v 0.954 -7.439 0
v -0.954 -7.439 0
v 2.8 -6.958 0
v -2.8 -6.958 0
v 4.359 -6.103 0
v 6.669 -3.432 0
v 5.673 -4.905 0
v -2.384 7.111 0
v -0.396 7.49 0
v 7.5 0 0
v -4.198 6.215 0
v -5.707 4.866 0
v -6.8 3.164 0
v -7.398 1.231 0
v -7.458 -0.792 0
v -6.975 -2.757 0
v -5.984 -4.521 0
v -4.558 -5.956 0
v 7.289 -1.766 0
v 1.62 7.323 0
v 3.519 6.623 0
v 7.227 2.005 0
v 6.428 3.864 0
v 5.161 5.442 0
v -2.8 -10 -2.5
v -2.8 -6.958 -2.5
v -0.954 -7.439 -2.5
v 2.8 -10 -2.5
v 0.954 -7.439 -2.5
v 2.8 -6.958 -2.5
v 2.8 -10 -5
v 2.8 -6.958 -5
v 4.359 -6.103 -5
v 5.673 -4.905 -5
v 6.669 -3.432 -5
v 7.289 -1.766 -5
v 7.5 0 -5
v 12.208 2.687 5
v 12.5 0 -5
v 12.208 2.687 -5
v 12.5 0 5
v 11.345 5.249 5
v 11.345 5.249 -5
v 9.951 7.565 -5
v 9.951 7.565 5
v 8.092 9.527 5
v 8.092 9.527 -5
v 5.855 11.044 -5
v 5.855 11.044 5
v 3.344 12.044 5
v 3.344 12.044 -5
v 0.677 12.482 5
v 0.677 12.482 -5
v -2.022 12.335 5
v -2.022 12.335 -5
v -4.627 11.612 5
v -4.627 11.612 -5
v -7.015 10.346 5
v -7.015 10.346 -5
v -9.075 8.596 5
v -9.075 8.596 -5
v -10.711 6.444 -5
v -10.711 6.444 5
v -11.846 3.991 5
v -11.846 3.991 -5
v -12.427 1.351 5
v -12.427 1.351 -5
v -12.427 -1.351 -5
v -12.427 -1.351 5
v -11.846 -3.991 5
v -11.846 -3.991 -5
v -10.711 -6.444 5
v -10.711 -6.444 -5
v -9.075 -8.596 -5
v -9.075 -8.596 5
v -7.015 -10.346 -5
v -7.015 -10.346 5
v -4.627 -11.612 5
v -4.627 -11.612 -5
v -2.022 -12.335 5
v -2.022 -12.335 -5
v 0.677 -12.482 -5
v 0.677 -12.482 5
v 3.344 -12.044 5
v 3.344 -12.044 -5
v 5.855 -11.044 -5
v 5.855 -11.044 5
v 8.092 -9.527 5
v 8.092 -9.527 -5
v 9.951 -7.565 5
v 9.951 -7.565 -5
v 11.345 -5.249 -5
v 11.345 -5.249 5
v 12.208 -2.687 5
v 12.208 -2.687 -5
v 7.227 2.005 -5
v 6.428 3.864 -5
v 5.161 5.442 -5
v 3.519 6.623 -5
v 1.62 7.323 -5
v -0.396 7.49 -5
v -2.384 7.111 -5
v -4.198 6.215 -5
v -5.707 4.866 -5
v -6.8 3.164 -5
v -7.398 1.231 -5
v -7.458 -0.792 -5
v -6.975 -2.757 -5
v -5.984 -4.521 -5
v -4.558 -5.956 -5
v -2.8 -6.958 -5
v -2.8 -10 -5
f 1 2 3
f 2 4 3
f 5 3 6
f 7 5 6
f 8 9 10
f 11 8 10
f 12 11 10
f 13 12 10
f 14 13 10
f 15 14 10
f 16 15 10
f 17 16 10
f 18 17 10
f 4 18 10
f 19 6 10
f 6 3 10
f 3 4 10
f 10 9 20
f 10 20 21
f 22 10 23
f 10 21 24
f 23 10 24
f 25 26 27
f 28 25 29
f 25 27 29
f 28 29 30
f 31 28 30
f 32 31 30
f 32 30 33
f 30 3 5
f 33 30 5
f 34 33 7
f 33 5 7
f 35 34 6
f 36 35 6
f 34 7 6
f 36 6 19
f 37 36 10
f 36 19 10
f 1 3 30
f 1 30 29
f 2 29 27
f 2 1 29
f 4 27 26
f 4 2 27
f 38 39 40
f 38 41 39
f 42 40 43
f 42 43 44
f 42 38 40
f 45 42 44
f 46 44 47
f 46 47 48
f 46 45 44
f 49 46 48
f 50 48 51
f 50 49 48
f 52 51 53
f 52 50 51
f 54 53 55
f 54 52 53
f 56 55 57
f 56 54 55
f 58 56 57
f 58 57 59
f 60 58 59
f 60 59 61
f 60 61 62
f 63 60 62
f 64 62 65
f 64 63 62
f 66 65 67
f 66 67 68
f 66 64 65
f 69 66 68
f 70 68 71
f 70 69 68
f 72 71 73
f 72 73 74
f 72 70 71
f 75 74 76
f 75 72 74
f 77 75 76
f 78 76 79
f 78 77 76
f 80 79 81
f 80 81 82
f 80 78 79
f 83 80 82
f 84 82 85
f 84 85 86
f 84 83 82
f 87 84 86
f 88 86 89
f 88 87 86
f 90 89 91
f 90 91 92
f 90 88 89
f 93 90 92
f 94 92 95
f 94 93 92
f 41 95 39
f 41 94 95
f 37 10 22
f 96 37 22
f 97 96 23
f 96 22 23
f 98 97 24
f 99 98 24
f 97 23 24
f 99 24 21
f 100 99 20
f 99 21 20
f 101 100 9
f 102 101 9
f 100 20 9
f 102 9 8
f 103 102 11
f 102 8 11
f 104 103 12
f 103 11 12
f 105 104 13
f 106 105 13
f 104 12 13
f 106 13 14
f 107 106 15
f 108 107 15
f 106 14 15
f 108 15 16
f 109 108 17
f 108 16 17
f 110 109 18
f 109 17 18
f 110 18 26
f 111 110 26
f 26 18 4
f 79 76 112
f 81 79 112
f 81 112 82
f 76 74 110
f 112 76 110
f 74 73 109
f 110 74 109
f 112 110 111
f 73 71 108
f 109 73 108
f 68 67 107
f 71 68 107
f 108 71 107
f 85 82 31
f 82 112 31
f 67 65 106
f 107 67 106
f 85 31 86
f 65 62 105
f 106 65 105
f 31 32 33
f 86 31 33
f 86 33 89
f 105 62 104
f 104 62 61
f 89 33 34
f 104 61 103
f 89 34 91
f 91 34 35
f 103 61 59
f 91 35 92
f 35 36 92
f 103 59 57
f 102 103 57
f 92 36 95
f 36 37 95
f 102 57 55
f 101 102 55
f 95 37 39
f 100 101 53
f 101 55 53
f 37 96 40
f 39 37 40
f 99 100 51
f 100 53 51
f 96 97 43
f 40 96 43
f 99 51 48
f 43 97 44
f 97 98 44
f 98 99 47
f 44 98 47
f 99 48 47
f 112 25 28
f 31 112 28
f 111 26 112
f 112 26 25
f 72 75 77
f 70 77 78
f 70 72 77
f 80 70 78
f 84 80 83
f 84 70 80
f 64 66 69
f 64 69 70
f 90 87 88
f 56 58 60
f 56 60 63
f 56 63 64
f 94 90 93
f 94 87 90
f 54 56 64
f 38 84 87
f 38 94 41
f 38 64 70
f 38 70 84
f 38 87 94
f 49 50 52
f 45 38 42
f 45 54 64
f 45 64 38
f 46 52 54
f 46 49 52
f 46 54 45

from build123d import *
from build123d import SkipClean  # not in build123d's __all__

# Parameters (mm, degrees)
F0_R     = 12.5
F1_DEPTH = 5
F2_DEPTH = 5.001
F3_DEPTH = 2.5


with BuildPart() as f1:
    # F0 (on Top) → F1 (new body, symmetric)
    with BuildSketch(Plane.XY):
        Circle(F0_R)
        with BuildLine():
            ThreePointArc((-2.8, -6.9577295147), (-4.1982139059, 6.2149014473), (7.5, 0))
            ThreePointArc((7.5, 0), (6.2149014473, -4.1982139059), (2.8, -6.9577295147))
            Line((2.8, -6.9577295147), (2.8, -10))
            Line((2.8, -10), (0, -10))
            Line((0, -10), (-2.8, -10))
            Line((-2.8, -10), (-2.8, -6.9577295147))
        make_face(mode=Mode.SUBTRACT)
        with BuildLine():
            ThreePointArc((2.8, -6.9577295147), (6.2149014473, -4.1982139059), (7.5, 0))
            ThreePointArc((7.5, 0), (-4.1982139059, 6.2149014473), (-2.8, -6.9577295147))
            ThreePointArc((-2.8, -6.9577295147), (0, -7.5), (2.8, -6.9577295147))
        make_face()
        with BuildLine():
            ThreePointArc((2.8, -6.9577295147), (0, -7.5), (-2.8, -6.9577295147))
            Line((-2.8, -6.9577295147), (-2.8, -10))
            Line((-2.8, -10), (0, -10))
            Line((0, -10), (2.8, -10))
            Line((2.8, -10), (2.8, -6.9577295147))
        make_face()
    extrude(amount=F1_DEPTH, both=True)

    # F0 (on Top) → F2 (cut, through all)
    with BuildSketch(Plane.XY):
        with BuildLine():
            ThreePointArc((2.8, -6.9577295147), (0, -7.5), (-2.8, -6.9577295147))
            Line((-2.8, -6.9577295147), (-2.8, -10))
            Line((-2.8, -10), (0, -10))
            Line((0, -10), (2.8, -10))
            Line((2.8, -10), (2.8, -6.9577295147))
        make_face()
        with BuildLine():
            ThreePointArc((2.8, -6.9577295147), (6.2149014473, -4.1982139059), (7.5, 0))
            ThreePointArc((7.5, 0), (-4.1982139059, 6.2149014473), (-2.8, -6.9577295147))
            ThreePointArc((-2.8, -6.9577295147), (0, -7.5), (2.8, -6.9577295147))
        make_face()
    extrude(amount=-F2_DEPTH, mode=Mode.SUBTRACT)

    # F0 (on Top) → F3 (join)
    with BuildSketch(Plane.XY):
        with BuildLine():
            ThreePointArc((2.8, -6.9577295147), (0, -7.5), (-2.8, -6.9577295147))
            Line((-2.8, -6.9577295147), (-2.8, -10))
            Line((-2.8, -10), (0, -10))
            Line((0, -10), (2.8, -10))
            Line((2.8, -10), (2.8, -6.9577295147))
        make_face()
    with SkipClean():  # cleaning this boolean's faces spoils the solid; the shape is the same uncleaned
        extrude(amount=-F3_DEPTH)


solid = f1.part
